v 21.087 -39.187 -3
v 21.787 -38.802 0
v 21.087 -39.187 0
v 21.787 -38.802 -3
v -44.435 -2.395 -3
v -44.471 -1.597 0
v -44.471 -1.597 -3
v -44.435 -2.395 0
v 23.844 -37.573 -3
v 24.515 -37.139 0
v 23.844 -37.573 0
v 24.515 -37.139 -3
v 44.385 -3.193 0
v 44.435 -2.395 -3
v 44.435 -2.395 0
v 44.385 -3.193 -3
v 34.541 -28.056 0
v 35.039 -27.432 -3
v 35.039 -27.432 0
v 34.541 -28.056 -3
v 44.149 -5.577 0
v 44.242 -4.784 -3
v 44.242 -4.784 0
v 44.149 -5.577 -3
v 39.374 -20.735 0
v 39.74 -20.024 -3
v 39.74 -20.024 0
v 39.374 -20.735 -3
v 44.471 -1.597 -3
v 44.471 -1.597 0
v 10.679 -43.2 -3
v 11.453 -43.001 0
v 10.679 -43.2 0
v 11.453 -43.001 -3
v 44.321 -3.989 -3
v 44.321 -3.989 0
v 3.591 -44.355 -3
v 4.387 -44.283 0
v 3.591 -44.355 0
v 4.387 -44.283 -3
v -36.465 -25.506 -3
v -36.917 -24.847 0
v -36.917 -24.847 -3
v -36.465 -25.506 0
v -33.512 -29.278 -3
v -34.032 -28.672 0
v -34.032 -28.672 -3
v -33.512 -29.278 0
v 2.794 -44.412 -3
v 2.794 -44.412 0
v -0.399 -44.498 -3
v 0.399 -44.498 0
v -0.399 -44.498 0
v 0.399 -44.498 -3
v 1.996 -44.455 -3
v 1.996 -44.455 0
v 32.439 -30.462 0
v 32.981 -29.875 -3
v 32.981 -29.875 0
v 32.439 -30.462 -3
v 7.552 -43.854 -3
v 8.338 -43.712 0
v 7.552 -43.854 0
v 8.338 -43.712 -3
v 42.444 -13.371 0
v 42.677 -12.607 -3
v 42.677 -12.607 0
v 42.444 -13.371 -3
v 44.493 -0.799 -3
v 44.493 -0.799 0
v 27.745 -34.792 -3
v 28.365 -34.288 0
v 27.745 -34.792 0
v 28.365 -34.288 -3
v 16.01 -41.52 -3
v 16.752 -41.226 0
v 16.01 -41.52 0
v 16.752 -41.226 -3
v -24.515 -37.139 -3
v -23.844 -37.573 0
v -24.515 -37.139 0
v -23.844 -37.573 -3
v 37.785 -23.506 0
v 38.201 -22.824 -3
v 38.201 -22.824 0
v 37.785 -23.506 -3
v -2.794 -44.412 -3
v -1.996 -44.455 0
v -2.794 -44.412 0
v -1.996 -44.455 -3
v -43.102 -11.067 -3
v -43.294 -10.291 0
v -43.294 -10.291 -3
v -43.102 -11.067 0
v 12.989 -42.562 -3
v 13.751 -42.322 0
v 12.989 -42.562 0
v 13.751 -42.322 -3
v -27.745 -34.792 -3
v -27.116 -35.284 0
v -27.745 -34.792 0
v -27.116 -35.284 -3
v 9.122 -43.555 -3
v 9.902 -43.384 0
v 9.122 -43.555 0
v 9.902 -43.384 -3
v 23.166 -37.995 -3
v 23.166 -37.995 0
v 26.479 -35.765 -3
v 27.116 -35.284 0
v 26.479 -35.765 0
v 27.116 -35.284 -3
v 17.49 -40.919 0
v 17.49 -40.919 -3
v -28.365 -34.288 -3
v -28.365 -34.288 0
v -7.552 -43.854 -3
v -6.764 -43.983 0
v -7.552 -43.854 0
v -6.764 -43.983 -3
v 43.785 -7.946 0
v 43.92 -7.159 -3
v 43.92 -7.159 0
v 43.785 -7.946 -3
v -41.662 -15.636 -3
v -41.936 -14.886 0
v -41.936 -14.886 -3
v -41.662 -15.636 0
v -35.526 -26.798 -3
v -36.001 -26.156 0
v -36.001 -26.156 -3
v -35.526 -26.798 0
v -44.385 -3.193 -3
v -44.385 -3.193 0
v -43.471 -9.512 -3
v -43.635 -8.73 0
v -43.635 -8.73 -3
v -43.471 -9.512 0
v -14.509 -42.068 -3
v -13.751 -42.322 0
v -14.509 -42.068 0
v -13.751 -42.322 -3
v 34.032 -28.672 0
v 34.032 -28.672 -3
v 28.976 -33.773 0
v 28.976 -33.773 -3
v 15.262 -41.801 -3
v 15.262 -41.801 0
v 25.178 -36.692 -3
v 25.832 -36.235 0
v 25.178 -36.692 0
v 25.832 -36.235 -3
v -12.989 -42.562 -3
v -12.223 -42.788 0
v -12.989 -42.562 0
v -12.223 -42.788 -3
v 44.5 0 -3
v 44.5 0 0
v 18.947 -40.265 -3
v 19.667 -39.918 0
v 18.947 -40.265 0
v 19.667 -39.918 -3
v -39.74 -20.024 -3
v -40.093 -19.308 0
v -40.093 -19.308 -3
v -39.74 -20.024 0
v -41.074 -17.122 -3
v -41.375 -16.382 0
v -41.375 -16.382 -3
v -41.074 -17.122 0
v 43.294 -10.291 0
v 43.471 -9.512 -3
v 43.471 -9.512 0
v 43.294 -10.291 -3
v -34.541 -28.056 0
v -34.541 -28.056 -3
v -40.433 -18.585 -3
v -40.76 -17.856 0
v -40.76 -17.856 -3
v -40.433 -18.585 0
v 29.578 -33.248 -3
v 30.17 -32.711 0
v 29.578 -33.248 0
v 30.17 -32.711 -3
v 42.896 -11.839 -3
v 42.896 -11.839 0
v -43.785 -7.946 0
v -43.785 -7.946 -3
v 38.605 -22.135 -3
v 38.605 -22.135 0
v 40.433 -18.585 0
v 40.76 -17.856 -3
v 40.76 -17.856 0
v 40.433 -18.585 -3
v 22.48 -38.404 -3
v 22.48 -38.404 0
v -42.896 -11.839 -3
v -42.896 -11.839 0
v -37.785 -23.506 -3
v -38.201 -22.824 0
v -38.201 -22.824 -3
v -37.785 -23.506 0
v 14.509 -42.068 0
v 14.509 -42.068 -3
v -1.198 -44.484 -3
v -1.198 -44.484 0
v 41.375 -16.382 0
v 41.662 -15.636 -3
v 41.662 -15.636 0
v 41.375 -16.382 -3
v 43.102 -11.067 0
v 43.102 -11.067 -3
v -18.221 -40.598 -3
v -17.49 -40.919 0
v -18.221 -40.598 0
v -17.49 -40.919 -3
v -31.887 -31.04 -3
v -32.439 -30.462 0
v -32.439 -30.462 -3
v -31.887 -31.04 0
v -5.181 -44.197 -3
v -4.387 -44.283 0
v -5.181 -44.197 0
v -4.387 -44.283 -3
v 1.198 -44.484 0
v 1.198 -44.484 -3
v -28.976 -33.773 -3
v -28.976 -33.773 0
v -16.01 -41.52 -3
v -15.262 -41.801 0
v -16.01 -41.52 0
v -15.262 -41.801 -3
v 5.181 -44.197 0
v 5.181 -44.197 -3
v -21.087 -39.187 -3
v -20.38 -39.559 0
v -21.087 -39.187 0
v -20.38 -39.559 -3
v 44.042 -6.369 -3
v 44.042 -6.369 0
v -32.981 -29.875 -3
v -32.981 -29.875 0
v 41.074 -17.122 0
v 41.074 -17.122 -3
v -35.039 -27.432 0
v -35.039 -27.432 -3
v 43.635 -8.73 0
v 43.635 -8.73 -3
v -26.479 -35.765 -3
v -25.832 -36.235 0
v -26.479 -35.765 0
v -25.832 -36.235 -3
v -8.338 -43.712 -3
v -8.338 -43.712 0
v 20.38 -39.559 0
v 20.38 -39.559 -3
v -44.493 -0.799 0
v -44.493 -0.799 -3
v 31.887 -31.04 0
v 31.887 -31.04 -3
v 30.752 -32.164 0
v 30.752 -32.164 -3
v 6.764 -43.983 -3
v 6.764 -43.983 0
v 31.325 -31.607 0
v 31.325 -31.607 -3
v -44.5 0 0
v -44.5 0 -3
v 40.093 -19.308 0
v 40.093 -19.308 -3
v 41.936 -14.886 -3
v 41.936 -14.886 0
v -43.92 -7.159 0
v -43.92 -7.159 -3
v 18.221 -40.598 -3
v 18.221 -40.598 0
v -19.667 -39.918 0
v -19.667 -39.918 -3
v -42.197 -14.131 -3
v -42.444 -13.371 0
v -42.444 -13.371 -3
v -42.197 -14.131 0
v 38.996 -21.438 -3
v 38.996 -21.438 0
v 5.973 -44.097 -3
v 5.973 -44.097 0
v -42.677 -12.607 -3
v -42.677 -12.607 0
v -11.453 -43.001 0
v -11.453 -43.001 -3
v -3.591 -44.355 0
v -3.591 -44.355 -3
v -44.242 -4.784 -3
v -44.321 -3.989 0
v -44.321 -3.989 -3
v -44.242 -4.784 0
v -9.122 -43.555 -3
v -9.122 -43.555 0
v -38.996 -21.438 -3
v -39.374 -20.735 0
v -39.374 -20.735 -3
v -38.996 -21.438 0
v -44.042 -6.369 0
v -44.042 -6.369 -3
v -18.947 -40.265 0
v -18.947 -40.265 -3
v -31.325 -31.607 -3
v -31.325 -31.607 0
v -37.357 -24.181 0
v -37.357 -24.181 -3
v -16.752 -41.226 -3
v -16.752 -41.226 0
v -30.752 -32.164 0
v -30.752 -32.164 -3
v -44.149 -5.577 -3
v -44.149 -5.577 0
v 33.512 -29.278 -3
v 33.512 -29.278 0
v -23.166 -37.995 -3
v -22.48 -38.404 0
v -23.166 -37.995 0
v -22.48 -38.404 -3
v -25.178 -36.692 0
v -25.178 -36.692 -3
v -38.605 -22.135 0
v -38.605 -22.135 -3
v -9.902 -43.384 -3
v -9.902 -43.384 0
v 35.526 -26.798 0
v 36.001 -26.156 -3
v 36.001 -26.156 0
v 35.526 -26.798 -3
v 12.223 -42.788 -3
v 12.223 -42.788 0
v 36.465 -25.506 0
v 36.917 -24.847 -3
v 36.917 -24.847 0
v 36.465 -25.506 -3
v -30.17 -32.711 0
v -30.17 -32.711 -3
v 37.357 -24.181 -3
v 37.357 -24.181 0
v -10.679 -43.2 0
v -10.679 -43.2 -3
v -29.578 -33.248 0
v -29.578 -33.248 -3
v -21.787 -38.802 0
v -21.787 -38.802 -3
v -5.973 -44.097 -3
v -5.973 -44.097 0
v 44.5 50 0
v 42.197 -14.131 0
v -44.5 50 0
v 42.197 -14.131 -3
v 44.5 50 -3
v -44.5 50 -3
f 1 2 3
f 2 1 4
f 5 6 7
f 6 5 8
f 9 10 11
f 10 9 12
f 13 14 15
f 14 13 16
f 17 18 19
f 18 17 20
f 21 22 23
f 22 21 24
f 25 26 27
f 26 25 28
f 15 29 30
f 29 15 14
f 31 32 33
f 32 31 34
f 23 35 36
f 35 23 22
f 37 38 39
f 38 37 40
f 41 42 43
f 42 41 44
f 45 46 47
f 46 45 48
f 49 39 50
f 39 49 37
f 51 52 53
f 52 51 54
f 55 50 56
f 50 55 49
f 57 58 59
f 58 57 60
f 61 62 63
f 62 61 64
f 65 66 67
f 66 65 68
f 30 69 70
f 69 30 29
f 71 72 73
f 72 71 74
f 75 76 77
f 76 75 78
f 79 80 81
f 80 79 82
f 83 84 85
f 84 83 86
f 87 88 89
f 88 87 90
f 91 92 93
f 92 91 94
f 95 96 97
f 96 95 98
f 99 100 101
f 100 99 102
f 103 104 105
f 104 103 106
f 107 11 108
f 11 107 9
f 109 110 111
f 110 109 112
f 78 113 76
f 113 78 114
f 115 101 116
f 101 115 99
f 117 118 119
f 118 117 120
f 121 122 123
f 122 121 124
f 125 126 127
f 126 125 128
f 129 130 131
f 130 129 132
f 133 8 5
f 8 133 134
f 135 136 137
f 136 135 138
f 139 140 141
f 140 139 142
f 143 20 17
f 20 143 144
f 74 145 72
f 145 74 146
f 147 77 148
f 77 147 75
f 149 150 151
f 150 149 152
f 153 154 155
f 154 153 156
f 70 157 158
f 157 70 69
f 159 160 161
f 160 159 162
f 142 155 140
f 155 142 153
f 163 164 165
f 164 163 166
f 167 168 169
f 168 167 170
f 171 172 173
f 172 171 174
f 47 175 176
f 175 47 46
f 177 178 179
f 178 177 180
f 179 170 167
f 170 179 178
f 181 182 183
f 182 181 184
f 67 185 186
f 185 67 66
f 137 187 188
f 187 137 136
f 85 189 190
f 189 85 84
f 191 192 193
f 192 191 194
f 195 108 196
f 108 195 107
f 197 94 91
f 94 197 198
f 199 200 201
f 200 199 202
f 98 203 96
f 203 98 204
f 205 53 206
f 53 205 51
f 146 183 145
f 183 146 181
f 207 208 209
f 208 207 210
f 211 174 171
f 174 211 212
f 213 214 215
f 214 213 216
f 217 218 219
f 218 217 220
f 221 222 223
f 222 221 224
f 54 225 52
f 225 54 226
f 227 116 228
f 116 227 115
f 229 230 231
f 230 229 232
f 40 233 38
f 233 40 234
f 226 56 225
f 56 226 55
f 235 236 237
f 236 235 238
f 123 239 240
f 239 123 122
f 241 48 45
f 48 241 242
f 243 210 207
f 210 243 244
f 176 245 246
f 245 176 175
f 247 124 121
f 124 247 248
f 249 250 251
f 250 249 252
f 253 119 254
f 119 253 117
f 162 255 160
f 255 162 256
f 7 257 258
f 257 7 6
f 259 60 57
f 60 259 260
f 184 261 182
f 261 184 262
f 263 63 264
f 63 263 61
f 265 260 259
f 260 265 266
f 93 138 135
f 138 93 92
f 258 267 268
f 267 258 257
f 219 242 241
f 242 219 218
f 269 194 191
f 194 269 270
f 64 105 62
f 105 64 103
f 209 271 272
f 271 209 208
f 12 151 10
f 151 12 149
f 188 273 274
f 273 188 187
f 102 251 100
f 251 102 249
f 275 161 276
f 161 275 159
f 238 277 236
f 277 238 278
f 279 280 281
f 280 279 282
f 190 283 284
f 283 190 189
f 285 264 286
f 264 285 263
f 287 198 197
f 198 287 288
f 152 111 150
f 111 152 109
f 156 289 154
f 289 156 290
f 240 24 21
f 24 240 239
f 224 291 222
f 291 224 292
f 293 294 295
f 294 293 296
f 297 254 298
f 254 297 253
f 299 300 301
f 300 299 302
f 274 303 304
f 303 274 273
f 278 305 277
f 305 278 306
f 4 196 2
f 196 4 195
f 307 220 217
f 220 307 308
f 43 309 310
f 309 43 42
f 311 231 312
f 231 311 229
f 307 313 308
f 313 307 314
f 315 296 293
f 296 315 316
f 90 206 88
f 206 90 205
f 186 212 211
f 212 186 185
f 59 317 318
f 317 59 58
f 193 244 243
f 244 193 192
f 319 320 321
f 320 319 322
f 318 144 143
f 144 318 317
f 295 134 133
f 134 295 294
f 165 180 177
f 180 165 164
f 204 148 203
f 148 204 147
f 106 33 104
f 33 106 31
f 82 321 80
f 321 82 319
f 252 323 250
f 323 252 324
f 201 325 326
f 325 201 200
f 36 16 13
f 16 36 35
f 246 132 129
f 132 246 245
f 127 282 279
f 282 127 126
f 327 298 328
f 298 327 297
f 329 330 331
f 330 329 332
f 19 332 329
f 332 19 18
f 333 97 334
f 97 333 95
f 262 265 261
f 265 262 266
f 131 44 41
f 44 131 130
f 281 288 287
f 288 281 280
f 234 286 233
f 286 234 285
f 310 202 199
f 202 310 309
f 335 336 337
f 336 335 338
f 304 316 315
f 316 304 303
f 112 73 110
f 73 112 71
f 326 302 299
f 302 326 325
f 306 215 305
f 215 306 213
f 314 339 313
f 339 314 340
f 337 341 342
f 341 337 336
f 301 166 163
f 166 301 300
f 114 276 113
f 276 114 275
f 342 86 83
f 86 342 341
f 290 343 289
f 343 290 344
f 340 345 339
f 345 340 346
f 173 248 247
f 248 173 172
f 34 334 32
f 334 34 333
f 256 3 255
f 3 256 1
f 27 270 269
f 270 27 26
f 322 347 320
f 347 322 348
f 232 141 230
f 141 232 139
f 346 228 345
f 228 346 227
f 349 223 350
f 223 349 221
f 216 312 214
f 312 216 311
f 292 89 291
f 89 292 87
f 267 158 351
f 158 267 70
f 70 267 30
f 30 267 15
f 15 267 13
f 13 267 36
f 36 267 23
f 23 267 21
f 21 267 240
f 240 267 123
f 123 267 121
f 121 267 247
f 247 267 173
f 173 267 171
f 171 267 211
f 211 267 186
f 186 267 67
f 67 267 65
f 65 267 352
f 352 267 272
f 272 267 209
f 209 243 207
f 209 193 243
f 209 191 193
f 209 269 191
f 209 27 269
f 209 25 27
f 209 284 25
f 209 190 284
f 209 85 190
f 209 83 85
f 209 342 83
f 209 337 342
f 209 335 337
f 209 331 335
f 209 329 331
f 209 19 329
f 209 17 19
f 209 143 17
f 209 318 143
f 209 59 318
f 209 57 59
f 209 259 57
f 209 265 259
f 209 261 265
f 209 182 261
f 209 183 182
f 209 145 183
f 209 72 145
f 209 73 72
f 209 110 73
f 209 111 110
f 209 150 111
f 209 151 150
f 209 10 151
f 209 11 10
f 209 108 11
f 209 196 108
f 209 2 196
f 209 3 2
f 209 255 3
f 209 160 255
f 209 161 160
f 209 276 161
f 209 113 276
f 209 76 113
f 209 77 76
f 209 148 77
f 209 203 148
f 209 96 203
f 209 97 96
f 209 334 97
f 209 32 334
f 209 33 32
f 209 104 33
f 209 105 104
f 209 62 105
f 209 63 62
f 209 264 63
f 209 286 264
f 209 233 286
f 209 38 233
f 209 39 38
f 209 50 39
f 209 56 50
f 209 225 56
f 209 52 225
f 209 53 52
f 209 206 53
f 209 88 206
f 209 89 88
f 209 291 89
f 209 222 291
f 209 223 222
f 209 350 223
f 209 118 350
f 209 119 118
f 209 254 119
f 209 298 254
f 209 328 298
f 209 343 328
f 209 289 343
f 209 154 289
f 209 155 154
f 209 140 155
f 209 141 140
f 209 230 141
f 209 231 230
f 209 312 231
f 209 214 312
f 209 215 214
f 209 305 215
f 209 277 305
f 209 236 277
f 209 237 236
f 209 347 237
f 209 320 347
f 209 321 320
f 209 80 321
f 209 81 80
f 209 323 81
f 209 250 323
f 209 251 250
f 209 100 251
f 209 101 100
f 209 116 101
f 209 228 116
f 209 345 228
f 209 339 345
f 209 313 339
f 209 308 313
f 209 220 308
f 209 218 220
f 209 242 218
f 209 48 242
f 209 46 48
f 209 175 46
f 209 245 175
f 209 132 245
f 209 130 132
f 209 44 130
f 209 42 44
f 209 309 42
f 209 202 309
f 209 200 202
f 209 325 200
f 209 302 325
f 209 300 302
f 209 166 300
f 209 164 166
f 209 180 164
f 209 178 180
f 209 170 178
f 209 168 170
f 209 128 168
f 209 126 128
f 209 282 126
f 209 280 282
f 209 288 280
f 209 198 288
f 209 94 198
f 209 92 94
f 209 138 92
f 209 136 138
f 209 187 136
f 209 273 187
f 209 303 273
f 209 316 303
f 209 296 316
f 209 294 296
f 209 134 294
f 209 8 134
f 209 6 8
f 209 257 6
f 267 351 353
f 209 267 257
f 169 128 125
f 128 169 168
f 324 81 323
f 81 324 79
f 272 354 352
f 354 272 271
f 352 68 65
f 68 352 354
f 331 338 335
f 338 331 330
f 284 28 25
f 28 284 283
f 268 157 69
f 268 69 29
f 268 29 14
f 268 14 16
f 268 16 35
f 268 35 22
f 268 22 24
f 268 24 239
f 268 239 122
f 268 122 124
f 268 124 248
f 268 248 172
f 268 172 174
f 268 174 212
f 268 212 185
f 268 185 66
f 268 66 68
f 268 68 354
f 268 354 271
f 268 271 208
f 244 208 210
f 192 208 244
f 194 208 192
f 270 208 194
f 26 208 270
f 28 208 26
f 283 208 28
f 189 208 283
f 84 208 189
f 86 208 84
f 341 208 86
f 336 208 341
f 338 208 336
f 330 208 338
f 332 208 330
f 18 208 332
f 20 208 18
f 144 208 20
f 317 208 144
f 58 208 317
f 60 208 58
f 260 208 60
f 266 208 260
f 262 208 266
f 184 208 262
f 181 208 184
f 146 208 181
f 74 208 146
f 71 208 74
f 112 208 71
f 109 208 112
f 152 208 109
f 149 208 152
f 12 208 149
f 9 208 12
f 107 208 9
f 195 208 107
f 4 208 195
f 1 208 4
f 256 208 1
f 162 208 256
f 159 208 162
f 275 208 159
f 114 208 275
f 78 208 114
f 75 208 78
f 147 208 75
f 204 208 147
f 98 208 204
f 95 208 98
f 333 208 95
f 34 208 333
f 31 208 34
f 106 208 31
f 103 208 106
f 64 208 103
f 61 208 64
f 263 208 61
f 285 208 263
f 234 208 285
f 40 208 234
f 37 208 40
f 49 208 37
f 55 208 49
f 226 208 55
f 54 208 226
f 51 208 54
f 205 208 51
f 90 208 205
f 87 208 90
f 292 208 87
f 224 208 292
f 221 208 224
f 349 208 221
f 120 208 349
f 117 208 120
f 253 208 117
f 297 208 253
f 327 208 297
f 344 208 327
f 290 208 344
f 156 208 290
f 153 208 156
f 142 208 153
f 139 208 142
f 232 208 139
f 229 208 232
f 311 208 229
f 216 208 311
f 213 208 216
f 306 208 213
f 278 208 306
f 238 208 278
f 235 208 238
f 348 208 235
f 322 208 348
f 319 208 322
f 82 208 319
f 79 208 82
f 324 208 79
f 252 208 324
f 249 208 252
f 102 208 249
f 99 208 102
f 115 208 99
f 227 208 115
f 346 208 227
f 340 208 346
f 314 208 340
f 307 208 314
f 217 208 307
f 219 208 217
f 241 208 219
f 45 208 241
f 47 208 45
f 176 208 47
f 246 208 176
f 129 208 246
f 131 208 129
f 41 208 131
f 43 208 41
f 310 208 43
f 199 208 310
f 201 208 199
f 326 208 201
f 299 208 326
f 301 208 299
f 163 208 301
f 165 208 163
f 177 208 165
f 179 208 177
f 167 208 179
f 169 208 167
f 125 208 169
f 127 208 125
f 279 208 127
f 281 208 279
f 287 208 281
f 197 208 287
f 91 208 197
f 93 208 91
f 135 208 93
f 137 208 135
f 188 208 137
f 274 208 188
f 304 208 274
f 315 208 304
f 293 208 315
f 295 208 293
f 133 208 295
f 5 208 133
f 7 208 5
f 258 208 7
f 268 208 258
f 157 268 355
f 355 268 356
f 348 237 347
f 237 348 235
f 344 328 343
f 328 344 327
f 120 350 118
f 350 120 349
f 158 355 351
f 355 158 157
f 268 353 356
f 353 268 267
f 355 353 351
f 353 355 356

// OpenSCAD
use <MCAD/regular_shapes.scad>


$fs=0.8; //minimum is 0.01
$fa=0.8;

// --- Ring Magnet Dimensions ---
D= 31; // Inner Diameter of Ring Magnet
RMda = 85; // Outer Diameter of Ring Magnet
RMthick = 11; // Thickness of Ring Magnet

// --- Floater Dimensions ---
FloatD = 25; //Diameter of Floater
FloatT = 4; //Thickness of Floater
FloatZ = RMthick + 14; //Levitation Hight

// --- Coil Dimensions ---
di= 5; // Diameter of core
skin= 0.8; //minimum material thickness
l= 15; //overall height of coil
domax=D*(sqrt(2)-1)-0.1; //calculate maximum outer coil diameter
do=domax;
h=(do-di-2*skin)/2; //calculate remaining height for windings

// --- Base Plate Dimensions ---
BPt = 3; //thickness

// --- Tool Dimensions ---
rhex=(25.4/8)/cos(30); //radius of a 1/4" bit, for the flat side

echo(do,h);



translate([0,0,-BPt/2]) BasePlate();

//projection(true){
    *rotate([-90,45,0]) {
        // Four Coils
        translate([0,0,l/2]){
            translate([do/2,do/2,0]) Coil();
            translate([-do/2,do/2,0]) Coil();
            translate([do/2,-do/2,0]) Coil();
            translate([-do/2,-do/2,0]) Coil();
        }
        // Ring Magnet
        RingMagnet();
        
        // Floater
        *color ("DimGray") translate([0,0,FloatZ]) cylinder(h=FloatT, d=FloatD, center=true);
        
        //Melexis Rotary IC SO-8
        *color ("coral") rotate ([0,0,45]) translate([0,0,l+skin]) cube([6.4,4.9,1.1],true);
        
        // One Coil
        *Coil();
        
        // BasePlate
        color ("LightGray",0.5)
        translate([0,0,-BPt/2]) BasePlate();
    }
//}



module Coil()
{
    // Windings
    color ("Crimson")
    *difference(){ 
        cylinder(h=l-0.1-2*skin, d=do-0.1, center=true);
        cylinder(h=l+1, d=di+0.2+2*skin, center=true);
    }
    
    // Corpus
    color ("CornFlowerBlue")
    difference(){
        cylinder(h=l, d=do, center=true);
        cylinder(h=l+1, d=di+0.1, center=true);
        cube([di+2*skin+0.1,skin,l+0.1],true);
        difference(){
            cylinder(h=(l-2*skin), d=do+2, center=true);
            cylinder(h=l+1, d=di+2*skin, center=true);
        }
    }
    // Core
    *color ("Silver") cylinder(h=l, d=di, center=true);
        
}
module Tool()
union(){
    translate([0,0,l/2+4])hexagon_prism(15,rhex);
  
    cylinder(h=l+2,d=di-0.1,center=true);
    translate([0,0,2*skin])cube([di+2*skin-0.1,skin-0.1,l],true);
    
    translate([0,0,l/2]) cylinder(h=5,r=rhex);
}

module RingMagnet()
{
    color ("DimGray") translate ([0,0,RMthick/2]) difference(){
        cylinder(d=RMda,h=RMthick,center=true);
        cylinder(d=D,h=RMthick+0.1,center=true);
    }
}

module BasePlate()
{
    width = RMda + 4;
    union(){
        cylinder(h=BPt, d=width,center=true);
        translate ([-width/2,0,-BPt/2]) cube ([width,50,BPt]);
    }
}
